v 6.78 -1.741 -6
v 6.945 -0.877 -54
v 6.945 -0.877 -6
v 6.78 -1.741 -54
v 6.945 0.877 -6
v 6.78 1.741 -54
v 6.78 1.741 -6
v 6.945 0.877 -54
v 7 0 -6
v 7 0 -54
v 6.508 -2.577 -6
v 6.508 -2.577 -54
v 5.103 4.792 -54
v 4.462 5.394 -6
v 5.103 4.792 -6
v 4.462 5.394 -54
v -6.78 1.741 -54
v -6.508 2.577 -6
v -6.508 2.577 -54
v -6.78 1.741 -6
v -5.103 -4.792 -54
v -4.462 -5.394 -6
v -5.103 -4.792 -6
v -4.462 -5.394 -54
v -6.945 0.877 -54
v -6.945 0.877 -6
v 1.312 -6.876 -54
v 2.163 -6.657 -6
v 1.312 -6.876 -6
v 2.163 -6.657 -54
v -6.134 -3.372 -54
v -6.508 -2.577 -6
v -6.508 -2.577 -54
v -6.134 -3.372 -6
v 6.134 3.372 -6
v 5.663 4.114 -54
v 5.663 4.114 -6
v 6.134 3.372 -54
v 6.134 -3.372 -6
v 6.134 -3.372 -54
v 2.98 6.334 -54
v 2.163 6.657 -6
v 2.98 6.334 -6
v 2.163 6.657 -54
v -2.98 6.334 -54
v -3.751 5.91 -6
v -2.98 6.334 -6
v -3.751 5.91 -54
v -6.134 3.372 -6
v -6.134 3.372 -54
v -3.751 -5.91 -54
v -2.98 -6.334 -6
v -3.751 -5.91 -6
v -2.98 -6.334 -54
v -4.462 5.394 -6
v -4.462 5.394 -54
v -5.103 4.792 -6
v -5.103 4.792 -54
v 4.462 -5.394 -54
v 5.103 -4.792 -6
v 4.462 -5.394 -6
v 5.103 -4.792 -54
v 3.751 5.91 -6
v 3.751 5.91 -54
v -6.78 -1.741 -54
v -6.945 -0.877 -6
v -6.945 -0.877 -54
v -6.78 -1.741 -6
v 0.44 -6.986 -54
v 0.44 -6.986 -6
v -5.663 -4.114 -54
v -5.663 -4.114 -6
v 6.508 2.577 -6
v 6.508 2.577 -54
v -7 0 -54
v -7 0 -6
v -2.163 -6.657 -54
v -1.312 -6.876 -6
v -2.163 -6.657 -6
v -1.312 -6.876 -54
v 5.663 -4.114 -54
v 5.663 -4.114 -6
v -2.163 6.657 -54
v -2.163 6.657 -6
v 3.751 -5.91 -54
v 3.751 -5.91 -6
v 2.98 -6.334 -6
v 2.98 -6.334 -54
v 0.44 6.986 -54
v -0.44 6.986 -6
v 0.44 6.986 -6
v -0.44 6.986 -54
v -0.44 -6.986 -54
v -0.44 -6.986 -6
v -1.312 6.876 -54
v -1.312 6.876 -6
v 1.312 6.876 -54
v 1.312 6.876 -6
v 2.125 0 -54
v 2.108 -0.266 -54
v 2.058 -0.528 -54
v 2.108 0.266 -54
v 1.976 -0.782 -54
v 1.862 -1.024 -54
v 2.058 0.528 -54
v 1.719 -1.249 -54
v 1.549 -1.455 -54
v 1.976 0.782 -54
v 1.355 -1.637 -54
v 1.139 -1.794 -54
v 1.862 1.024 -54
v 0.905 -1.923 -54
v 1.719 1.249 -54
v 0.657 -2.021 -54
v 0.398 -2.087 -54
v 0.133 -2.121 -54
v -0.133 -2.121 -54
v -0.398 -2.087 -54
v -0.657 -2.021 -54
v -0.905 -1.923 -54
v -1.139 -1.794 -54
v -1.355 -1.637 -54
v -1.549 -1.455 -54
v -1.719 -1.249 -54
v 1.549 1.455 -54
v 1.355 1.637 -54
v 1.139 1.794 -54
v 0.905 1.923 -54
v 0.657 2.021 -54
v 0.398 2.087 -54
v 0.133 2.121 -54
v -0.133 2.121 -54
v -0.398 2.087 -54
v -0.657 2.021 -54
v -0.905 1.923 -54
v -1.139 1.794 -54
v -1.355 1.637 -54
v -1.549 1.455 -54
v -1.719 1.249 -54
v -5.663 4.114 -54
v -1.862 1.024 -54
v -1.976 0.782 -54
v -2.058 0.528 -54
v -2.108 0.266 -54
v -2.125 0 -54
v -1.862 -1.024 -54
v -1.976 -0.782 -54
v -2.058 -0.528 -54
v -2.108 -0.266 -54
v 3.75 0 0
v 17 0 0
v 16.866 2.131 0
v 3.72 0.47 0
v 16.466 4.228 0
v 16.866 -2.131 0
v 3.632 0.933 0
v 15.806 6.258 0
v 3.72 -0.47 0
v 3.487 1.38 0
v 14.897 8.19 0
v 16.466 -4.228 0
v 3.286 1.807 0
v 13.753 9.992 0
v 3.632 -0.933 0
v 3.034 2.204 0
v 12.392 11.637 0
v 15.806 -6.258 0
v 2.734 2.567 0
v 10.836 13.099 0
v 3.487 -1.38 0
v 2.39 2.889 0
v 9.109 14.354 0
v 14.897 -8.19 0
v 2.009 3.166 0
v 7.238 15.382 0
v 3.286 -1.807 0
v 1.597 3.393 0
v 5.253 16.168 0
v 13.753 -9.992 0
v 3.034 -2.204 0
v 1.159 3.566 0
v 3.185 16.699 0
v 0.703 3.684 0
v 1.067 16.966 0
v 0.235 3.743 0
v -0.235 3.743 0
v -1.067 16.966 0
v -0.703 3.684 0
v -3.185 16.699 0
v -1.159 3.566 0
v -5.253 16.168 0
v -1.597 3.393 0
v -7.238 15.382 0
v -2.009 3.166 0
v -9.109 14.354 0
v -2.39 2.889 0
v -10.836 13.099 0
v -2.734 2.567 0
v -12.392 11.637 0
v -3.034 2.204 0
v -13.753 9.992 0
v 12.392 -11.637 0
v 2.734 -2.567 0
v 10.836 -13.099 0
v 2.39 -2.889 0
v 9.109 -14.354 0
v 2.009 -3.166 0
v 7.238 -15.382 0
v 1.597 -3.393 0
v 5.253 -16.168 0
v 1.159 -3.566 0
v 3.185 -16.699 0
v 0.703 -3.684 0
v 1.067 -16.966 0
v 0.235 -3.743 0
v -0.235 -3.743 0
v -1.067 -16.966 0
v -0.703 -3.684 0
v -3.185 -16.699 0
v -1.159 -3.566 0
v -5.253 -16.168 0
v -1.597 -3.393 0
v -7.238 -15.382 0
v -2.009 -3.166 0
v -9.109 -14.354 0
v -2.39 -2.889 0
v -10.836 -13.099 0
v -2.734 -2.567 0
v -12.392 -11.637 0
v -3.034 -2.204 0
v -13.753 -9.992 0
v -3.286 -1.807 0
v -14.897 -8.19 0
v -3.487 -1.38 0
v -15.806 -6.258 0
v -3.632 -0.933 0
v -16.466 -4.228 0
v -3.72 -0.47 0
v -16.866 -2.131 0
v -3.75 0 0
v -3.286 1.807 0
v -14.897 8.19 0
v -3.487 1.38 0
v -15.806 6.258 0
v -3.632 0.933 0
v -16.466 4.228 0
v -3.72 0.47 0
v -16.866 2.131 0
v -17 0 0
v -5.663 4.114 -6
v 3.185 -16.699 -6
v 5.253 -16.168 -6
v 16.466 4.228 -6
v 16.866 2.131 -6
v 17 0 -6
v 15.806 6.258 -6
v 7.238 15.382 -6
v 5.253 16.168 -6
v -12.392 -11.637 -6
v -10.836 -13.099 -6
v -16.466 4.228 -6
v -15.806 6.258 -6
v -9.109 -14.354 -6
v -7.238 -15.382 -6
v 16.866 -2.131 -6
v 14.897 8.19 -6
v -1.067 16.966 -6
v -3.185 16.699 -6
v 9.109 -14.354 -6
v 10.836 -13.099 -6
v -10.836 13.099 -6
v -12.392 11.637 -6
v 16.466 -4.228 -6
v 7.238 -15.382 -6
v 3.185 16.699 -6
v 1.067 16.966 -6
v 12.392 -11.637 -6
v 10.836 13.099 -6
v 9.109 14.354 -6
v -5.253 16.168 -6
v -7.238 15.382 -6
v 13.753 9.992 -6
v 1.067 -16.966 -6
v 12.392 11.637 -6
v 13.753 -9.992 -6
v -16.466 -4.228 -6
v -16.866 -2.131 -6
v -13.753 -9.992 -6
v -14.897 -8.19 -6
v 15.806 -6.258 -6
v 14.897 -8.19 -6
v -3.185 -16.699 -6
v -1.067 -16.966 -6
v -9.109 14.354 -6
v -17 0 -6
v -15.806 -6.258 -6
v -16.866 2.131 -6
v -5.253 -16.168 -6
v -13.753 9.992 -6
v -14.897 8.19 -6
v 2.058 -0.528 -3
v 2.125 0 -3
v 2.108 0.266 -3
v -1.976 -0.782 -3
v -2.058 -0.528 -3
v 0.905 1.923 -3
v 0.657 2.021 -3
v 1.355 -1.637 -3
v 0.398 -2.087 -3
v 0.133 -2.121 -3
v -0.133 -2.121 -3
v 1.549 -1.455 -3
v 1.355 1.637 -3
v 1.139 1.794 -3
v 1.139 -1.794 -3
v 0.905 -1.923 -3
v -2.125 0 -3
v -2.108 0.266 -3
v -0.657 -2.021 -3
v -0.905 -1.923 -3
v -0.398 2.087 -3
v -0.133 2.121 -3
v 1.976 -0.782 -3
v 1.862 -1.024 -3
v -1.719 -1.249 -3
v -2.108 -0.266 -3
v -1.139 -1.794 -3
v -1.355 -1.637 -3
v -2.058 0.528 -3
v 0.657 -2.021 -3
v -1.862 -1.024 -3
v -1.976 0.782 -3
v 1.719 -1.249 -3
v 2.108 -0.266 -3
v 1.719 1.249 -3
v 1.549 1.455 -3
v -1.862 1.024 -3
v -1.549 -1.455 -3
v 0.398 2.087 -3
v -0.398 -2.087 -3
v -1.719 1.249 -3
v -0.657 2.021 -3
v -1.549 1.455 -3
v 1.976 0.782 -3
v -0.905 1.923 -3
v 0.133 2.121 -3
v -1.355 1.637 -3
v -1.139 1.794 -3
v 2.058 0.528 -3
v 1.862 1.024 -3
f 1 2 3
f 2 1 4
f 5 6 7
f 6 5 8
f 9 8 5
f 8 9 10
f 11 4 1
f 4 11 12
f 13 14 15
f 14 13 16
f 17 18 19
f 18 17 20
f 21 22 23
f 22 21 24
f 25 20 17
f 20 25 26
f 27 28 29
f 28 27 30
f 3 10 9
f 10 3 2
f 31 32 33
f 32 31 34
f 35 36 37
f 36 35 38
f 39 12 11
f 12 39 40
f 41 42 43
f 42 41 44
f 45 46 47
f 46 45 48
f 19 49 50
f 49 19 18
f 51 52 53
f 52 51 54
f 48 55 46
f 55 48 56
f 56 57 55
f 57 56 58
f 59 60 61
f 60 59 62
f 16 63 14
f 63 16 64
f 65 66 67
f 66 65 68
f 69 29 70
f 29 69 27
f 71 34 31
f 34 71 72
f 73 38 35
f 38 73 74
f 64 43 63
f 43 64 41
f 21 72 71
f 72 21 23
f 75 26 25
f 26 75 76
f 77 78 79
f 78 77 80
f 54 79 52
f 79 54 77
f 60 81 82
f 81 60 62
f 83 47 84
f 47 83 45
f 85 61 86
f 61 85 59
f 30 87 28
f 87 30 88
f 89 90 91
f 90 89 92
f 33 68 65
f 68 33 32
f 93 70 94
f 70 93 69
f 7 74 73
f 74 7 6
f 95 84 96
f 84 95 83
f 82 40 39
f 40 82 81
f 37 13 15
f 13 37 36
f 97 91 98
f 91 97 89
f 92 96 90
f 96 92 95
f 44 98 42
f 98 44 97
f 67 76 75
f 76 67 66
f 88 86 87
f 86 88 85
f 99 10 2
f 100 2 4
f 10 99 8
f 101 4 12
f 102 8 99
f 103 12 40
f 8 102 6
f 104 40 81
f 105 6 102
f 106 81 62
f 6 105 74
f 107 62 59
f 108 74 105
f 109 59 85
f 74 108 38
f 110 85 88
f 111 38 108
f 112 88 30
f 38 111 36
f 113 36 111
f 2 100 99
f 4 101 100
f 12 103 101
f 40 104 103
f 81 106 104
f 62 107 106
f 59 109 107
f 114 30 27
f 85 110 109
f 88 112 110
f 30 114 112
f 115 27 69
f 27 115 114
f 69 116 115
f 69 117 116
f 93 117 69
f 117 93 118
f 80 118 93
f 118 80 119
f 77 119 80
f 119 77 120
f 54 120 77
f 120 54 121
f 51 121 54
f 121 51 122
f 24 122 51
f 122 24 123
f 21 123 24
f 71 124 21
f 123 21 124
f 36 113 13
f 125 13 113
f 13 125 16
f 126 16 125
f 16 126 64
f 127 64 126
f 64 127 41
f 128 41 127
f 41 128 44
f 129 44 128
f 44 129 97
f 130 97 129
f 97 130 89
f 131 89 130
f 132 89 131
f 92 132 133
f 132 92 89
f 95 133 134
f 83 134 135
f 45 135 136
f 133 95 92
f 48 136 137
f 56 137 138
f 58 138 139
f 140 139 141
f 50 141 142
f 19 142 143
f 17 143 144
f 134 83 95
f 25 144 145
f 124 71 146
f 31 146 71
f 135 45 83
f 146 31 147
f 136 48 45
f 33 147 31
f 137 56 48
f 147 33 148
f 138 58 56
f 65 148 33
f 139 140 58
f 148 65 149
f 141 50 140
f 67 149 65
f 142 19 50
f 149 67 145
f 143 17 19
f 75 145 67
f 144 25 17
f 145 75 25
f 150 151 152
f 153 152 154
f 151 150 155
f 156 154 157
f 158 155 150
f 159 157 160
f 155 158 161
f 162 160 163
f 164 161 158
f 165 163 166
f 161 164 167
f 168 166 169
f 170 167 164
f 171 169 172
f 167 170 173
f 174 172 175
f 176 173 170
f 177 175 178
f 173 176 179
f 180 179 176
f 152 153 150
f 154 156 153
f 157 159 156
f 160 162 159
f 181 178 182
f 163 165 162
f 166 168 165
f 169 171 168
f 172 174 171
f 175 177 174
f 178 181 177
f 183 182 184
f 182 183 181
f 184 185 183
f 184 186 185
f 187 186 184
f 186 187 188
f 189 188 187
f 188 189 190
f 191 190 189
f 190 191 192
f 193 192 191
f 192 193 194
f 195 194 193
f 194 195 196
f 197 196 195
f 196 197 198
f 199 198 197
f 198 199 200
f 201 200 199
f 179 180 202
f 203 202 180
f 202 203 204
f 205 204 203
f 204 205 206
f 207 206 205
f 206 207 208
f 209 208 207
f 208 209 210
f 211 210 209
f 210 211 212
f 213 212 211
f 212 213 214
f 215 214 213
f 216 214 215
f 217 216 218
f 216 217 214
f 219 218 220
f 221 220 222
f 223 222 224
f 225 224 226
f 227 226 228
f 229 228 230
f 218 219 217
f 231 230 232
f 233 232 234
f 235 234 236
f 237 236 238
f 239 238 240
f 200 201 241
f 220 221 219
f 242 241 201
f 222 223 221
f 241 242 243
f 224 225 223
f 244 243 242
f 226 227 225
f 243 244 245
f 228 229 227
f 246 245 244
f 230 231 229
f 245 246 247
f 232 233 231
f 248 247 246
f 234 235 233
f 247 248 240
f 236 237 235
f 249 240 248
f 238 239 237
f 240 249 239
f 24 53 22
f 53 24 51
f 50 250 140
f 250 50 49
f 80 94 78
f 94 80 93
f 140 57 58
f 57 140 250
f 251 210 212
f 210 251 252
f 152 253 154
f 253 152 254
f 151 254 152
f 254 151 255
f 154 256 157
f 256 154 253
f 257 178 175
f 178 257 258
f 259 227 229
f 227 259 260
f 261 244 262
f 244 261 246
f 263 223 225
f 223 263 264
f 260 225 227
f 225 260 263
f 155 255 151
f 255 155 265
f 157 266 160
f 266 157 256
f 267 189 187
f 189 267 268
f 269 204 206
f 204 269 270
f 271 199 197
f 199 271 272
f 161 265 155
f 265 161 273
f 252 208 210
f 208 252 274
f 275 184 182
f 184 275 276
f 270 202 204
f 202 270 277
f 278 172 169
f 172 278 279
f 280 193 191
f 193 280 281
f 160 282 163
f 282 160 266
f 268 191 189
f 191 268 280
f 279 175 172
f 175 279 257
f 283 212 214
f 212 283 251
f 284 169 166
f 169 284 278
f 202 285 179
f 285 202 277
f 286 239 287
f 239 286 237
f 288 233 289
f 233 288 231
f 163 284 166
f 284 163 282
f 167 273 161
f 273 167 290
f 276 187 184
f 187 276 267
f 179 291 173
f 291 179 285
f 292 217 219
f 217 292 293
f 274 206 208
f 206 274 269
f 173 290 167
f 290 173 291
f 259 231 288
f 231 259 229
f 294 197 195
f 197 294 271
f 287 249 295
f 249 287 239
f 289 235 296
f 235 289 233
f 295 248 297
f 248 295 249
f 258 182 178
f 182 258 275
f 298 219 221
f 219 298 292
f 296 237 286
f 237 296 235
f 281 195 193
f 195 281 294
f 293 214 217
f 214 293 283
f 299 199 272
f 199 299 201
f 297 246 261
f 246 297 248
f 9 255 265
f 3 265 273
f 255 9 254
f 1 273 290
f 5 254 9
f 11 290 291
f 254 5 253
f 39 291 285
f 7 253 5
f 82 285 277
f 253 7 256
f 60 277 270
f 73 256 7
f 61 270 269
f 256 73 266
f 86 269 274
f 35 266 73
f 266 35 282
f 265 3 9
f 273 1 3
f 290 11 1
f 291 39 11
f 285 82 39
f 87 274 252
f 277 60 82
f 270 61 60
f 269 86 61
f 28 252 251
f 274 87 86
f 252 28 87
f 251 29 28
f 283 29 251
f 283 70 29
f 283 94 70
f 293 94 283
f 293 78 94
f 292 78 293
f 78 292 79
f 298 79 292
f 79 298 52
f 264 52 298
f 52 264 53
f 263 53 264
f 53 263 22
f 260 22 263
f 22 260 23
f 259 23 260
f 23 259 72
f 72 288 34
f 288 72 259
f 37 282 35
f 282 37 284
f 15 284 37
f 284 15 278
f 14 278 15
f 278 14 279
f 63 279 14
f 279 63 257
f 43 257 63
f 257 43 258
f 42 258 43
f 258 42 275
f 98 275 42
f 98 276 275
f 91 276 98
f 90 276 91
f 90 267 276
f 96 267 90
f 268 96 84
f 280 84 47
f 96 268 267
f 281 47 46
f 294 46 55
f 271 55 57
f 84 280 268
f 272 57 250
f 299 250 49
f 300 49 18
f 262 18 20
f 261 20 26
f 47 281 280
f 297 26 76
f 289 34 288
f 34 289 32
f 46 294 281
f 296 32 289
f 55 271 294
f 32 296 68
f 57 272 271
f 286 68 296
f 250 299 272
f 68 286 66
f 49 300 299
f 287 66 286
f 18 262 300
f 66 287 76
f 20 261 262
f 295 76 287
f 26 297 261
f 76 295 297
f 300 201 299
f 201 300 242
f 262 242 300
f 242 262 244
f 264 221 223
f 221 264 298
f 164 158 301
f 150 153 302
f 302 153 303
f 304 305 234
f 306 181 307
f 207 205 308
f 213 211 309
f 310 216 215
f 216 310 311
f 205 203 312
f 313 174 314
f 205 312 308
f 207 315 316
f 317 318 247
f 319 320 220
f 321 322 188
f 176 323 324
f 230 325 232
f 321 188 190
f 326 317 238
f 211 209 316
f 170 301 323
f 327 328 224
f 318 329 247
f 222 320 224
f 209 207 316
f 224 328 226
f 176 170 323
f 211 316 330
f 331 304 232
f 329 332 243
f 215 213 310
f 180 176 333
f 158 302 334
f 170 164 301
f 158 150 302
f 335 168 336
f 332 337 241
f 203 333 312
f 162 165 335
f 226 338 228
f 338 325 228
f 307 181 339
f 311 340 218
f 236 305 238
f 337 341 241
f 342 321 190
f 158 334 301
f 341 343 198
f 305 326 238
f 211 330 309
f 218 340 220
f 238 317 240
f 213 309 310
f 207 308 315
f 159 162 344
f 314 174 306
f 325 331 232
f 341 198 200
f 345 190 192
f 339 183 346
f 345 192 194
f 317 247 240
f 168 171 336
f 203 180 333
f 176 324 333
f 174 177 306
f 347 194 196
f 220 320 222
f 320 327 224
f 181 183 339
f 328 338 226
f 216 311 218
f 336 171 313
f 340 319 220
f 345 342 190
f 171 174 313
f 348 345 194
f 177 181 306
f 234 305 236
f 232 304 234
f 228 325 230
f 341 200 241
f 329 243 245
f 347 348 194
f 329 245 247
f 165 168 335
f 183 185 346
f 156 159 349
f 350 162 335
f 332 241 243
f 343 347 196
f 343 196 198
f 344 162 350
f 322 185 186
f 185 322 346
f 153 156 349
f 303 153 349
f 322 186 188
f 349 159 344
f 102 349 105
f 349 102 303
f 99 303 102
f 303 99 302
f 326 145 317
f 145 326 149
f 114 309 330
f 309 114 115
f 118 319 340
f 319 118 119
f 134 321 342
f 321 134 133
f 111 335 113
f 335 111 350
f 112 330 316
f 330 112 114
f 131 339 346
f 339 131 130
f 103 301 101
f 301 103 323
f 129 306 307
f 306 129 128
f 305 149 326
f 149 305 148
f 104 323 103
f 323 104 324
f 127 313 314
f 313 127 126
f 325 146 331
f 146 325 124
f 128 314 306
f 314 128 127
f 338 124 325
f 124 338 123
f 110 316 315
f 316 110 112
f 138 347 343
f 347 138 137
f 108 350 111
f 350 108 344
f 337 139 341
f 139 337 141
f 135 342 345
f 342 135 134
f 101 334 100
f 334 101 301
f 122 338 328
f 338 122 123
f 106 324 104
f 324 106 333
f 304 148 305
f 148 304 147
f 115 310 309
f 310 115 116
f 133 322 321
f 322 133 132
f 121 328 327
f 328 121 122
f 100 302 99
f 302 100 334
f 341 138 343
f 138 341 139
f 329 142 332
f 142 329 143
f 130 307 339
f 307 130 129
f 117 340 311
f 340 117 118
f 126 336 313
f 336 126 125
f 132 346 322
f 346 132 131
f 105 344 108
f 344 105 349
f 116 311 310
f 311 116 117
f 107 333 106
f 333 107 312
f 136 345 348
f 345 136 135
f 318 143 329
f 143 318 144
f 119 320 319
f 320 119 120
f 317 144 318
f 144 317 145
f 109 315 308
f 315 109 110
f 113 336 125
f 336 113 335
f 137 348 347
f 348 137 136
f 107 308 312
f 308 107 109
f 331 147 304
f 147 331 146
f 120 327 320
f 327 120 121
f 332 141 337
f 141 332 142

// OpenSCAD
$fn = 50;


difference() {
	union() {
		translate(v = [0, 0, -54.0000000000]) {
			cylinder(h = 54, r = 7.0000000000);
		}
		translate(v = [0, 0, -6.0000000000]) {
			cylinder(h = 6, r = 17.0000000000);
		}
	}
	union() {
		translate(v = [0, 0, 0]) {
			rotate(a = [0, 0, 0]) {
				difference() {
					union() {
						#translate(v = [0, 0, -54.0000000000]) {
							cylinder(h = 54, r = 2.0000000000);
						}
						#translate(v = [0, 0, -3]) {
							cylinder(h = 3, r1 = 2.1250000000, r2 = 3.7500000000);
						}
						#translate(v = [0, 0, -54.0000000000]) {
							cylinder(h = 54, r = 2.1250000000);
						}
						#translate(v = [0, 0, -54.0000000000]) {
							cylinder(h = 54, r = 2.0000000000);
						}
					}
					union();
				}
			}
		}
	}
}
